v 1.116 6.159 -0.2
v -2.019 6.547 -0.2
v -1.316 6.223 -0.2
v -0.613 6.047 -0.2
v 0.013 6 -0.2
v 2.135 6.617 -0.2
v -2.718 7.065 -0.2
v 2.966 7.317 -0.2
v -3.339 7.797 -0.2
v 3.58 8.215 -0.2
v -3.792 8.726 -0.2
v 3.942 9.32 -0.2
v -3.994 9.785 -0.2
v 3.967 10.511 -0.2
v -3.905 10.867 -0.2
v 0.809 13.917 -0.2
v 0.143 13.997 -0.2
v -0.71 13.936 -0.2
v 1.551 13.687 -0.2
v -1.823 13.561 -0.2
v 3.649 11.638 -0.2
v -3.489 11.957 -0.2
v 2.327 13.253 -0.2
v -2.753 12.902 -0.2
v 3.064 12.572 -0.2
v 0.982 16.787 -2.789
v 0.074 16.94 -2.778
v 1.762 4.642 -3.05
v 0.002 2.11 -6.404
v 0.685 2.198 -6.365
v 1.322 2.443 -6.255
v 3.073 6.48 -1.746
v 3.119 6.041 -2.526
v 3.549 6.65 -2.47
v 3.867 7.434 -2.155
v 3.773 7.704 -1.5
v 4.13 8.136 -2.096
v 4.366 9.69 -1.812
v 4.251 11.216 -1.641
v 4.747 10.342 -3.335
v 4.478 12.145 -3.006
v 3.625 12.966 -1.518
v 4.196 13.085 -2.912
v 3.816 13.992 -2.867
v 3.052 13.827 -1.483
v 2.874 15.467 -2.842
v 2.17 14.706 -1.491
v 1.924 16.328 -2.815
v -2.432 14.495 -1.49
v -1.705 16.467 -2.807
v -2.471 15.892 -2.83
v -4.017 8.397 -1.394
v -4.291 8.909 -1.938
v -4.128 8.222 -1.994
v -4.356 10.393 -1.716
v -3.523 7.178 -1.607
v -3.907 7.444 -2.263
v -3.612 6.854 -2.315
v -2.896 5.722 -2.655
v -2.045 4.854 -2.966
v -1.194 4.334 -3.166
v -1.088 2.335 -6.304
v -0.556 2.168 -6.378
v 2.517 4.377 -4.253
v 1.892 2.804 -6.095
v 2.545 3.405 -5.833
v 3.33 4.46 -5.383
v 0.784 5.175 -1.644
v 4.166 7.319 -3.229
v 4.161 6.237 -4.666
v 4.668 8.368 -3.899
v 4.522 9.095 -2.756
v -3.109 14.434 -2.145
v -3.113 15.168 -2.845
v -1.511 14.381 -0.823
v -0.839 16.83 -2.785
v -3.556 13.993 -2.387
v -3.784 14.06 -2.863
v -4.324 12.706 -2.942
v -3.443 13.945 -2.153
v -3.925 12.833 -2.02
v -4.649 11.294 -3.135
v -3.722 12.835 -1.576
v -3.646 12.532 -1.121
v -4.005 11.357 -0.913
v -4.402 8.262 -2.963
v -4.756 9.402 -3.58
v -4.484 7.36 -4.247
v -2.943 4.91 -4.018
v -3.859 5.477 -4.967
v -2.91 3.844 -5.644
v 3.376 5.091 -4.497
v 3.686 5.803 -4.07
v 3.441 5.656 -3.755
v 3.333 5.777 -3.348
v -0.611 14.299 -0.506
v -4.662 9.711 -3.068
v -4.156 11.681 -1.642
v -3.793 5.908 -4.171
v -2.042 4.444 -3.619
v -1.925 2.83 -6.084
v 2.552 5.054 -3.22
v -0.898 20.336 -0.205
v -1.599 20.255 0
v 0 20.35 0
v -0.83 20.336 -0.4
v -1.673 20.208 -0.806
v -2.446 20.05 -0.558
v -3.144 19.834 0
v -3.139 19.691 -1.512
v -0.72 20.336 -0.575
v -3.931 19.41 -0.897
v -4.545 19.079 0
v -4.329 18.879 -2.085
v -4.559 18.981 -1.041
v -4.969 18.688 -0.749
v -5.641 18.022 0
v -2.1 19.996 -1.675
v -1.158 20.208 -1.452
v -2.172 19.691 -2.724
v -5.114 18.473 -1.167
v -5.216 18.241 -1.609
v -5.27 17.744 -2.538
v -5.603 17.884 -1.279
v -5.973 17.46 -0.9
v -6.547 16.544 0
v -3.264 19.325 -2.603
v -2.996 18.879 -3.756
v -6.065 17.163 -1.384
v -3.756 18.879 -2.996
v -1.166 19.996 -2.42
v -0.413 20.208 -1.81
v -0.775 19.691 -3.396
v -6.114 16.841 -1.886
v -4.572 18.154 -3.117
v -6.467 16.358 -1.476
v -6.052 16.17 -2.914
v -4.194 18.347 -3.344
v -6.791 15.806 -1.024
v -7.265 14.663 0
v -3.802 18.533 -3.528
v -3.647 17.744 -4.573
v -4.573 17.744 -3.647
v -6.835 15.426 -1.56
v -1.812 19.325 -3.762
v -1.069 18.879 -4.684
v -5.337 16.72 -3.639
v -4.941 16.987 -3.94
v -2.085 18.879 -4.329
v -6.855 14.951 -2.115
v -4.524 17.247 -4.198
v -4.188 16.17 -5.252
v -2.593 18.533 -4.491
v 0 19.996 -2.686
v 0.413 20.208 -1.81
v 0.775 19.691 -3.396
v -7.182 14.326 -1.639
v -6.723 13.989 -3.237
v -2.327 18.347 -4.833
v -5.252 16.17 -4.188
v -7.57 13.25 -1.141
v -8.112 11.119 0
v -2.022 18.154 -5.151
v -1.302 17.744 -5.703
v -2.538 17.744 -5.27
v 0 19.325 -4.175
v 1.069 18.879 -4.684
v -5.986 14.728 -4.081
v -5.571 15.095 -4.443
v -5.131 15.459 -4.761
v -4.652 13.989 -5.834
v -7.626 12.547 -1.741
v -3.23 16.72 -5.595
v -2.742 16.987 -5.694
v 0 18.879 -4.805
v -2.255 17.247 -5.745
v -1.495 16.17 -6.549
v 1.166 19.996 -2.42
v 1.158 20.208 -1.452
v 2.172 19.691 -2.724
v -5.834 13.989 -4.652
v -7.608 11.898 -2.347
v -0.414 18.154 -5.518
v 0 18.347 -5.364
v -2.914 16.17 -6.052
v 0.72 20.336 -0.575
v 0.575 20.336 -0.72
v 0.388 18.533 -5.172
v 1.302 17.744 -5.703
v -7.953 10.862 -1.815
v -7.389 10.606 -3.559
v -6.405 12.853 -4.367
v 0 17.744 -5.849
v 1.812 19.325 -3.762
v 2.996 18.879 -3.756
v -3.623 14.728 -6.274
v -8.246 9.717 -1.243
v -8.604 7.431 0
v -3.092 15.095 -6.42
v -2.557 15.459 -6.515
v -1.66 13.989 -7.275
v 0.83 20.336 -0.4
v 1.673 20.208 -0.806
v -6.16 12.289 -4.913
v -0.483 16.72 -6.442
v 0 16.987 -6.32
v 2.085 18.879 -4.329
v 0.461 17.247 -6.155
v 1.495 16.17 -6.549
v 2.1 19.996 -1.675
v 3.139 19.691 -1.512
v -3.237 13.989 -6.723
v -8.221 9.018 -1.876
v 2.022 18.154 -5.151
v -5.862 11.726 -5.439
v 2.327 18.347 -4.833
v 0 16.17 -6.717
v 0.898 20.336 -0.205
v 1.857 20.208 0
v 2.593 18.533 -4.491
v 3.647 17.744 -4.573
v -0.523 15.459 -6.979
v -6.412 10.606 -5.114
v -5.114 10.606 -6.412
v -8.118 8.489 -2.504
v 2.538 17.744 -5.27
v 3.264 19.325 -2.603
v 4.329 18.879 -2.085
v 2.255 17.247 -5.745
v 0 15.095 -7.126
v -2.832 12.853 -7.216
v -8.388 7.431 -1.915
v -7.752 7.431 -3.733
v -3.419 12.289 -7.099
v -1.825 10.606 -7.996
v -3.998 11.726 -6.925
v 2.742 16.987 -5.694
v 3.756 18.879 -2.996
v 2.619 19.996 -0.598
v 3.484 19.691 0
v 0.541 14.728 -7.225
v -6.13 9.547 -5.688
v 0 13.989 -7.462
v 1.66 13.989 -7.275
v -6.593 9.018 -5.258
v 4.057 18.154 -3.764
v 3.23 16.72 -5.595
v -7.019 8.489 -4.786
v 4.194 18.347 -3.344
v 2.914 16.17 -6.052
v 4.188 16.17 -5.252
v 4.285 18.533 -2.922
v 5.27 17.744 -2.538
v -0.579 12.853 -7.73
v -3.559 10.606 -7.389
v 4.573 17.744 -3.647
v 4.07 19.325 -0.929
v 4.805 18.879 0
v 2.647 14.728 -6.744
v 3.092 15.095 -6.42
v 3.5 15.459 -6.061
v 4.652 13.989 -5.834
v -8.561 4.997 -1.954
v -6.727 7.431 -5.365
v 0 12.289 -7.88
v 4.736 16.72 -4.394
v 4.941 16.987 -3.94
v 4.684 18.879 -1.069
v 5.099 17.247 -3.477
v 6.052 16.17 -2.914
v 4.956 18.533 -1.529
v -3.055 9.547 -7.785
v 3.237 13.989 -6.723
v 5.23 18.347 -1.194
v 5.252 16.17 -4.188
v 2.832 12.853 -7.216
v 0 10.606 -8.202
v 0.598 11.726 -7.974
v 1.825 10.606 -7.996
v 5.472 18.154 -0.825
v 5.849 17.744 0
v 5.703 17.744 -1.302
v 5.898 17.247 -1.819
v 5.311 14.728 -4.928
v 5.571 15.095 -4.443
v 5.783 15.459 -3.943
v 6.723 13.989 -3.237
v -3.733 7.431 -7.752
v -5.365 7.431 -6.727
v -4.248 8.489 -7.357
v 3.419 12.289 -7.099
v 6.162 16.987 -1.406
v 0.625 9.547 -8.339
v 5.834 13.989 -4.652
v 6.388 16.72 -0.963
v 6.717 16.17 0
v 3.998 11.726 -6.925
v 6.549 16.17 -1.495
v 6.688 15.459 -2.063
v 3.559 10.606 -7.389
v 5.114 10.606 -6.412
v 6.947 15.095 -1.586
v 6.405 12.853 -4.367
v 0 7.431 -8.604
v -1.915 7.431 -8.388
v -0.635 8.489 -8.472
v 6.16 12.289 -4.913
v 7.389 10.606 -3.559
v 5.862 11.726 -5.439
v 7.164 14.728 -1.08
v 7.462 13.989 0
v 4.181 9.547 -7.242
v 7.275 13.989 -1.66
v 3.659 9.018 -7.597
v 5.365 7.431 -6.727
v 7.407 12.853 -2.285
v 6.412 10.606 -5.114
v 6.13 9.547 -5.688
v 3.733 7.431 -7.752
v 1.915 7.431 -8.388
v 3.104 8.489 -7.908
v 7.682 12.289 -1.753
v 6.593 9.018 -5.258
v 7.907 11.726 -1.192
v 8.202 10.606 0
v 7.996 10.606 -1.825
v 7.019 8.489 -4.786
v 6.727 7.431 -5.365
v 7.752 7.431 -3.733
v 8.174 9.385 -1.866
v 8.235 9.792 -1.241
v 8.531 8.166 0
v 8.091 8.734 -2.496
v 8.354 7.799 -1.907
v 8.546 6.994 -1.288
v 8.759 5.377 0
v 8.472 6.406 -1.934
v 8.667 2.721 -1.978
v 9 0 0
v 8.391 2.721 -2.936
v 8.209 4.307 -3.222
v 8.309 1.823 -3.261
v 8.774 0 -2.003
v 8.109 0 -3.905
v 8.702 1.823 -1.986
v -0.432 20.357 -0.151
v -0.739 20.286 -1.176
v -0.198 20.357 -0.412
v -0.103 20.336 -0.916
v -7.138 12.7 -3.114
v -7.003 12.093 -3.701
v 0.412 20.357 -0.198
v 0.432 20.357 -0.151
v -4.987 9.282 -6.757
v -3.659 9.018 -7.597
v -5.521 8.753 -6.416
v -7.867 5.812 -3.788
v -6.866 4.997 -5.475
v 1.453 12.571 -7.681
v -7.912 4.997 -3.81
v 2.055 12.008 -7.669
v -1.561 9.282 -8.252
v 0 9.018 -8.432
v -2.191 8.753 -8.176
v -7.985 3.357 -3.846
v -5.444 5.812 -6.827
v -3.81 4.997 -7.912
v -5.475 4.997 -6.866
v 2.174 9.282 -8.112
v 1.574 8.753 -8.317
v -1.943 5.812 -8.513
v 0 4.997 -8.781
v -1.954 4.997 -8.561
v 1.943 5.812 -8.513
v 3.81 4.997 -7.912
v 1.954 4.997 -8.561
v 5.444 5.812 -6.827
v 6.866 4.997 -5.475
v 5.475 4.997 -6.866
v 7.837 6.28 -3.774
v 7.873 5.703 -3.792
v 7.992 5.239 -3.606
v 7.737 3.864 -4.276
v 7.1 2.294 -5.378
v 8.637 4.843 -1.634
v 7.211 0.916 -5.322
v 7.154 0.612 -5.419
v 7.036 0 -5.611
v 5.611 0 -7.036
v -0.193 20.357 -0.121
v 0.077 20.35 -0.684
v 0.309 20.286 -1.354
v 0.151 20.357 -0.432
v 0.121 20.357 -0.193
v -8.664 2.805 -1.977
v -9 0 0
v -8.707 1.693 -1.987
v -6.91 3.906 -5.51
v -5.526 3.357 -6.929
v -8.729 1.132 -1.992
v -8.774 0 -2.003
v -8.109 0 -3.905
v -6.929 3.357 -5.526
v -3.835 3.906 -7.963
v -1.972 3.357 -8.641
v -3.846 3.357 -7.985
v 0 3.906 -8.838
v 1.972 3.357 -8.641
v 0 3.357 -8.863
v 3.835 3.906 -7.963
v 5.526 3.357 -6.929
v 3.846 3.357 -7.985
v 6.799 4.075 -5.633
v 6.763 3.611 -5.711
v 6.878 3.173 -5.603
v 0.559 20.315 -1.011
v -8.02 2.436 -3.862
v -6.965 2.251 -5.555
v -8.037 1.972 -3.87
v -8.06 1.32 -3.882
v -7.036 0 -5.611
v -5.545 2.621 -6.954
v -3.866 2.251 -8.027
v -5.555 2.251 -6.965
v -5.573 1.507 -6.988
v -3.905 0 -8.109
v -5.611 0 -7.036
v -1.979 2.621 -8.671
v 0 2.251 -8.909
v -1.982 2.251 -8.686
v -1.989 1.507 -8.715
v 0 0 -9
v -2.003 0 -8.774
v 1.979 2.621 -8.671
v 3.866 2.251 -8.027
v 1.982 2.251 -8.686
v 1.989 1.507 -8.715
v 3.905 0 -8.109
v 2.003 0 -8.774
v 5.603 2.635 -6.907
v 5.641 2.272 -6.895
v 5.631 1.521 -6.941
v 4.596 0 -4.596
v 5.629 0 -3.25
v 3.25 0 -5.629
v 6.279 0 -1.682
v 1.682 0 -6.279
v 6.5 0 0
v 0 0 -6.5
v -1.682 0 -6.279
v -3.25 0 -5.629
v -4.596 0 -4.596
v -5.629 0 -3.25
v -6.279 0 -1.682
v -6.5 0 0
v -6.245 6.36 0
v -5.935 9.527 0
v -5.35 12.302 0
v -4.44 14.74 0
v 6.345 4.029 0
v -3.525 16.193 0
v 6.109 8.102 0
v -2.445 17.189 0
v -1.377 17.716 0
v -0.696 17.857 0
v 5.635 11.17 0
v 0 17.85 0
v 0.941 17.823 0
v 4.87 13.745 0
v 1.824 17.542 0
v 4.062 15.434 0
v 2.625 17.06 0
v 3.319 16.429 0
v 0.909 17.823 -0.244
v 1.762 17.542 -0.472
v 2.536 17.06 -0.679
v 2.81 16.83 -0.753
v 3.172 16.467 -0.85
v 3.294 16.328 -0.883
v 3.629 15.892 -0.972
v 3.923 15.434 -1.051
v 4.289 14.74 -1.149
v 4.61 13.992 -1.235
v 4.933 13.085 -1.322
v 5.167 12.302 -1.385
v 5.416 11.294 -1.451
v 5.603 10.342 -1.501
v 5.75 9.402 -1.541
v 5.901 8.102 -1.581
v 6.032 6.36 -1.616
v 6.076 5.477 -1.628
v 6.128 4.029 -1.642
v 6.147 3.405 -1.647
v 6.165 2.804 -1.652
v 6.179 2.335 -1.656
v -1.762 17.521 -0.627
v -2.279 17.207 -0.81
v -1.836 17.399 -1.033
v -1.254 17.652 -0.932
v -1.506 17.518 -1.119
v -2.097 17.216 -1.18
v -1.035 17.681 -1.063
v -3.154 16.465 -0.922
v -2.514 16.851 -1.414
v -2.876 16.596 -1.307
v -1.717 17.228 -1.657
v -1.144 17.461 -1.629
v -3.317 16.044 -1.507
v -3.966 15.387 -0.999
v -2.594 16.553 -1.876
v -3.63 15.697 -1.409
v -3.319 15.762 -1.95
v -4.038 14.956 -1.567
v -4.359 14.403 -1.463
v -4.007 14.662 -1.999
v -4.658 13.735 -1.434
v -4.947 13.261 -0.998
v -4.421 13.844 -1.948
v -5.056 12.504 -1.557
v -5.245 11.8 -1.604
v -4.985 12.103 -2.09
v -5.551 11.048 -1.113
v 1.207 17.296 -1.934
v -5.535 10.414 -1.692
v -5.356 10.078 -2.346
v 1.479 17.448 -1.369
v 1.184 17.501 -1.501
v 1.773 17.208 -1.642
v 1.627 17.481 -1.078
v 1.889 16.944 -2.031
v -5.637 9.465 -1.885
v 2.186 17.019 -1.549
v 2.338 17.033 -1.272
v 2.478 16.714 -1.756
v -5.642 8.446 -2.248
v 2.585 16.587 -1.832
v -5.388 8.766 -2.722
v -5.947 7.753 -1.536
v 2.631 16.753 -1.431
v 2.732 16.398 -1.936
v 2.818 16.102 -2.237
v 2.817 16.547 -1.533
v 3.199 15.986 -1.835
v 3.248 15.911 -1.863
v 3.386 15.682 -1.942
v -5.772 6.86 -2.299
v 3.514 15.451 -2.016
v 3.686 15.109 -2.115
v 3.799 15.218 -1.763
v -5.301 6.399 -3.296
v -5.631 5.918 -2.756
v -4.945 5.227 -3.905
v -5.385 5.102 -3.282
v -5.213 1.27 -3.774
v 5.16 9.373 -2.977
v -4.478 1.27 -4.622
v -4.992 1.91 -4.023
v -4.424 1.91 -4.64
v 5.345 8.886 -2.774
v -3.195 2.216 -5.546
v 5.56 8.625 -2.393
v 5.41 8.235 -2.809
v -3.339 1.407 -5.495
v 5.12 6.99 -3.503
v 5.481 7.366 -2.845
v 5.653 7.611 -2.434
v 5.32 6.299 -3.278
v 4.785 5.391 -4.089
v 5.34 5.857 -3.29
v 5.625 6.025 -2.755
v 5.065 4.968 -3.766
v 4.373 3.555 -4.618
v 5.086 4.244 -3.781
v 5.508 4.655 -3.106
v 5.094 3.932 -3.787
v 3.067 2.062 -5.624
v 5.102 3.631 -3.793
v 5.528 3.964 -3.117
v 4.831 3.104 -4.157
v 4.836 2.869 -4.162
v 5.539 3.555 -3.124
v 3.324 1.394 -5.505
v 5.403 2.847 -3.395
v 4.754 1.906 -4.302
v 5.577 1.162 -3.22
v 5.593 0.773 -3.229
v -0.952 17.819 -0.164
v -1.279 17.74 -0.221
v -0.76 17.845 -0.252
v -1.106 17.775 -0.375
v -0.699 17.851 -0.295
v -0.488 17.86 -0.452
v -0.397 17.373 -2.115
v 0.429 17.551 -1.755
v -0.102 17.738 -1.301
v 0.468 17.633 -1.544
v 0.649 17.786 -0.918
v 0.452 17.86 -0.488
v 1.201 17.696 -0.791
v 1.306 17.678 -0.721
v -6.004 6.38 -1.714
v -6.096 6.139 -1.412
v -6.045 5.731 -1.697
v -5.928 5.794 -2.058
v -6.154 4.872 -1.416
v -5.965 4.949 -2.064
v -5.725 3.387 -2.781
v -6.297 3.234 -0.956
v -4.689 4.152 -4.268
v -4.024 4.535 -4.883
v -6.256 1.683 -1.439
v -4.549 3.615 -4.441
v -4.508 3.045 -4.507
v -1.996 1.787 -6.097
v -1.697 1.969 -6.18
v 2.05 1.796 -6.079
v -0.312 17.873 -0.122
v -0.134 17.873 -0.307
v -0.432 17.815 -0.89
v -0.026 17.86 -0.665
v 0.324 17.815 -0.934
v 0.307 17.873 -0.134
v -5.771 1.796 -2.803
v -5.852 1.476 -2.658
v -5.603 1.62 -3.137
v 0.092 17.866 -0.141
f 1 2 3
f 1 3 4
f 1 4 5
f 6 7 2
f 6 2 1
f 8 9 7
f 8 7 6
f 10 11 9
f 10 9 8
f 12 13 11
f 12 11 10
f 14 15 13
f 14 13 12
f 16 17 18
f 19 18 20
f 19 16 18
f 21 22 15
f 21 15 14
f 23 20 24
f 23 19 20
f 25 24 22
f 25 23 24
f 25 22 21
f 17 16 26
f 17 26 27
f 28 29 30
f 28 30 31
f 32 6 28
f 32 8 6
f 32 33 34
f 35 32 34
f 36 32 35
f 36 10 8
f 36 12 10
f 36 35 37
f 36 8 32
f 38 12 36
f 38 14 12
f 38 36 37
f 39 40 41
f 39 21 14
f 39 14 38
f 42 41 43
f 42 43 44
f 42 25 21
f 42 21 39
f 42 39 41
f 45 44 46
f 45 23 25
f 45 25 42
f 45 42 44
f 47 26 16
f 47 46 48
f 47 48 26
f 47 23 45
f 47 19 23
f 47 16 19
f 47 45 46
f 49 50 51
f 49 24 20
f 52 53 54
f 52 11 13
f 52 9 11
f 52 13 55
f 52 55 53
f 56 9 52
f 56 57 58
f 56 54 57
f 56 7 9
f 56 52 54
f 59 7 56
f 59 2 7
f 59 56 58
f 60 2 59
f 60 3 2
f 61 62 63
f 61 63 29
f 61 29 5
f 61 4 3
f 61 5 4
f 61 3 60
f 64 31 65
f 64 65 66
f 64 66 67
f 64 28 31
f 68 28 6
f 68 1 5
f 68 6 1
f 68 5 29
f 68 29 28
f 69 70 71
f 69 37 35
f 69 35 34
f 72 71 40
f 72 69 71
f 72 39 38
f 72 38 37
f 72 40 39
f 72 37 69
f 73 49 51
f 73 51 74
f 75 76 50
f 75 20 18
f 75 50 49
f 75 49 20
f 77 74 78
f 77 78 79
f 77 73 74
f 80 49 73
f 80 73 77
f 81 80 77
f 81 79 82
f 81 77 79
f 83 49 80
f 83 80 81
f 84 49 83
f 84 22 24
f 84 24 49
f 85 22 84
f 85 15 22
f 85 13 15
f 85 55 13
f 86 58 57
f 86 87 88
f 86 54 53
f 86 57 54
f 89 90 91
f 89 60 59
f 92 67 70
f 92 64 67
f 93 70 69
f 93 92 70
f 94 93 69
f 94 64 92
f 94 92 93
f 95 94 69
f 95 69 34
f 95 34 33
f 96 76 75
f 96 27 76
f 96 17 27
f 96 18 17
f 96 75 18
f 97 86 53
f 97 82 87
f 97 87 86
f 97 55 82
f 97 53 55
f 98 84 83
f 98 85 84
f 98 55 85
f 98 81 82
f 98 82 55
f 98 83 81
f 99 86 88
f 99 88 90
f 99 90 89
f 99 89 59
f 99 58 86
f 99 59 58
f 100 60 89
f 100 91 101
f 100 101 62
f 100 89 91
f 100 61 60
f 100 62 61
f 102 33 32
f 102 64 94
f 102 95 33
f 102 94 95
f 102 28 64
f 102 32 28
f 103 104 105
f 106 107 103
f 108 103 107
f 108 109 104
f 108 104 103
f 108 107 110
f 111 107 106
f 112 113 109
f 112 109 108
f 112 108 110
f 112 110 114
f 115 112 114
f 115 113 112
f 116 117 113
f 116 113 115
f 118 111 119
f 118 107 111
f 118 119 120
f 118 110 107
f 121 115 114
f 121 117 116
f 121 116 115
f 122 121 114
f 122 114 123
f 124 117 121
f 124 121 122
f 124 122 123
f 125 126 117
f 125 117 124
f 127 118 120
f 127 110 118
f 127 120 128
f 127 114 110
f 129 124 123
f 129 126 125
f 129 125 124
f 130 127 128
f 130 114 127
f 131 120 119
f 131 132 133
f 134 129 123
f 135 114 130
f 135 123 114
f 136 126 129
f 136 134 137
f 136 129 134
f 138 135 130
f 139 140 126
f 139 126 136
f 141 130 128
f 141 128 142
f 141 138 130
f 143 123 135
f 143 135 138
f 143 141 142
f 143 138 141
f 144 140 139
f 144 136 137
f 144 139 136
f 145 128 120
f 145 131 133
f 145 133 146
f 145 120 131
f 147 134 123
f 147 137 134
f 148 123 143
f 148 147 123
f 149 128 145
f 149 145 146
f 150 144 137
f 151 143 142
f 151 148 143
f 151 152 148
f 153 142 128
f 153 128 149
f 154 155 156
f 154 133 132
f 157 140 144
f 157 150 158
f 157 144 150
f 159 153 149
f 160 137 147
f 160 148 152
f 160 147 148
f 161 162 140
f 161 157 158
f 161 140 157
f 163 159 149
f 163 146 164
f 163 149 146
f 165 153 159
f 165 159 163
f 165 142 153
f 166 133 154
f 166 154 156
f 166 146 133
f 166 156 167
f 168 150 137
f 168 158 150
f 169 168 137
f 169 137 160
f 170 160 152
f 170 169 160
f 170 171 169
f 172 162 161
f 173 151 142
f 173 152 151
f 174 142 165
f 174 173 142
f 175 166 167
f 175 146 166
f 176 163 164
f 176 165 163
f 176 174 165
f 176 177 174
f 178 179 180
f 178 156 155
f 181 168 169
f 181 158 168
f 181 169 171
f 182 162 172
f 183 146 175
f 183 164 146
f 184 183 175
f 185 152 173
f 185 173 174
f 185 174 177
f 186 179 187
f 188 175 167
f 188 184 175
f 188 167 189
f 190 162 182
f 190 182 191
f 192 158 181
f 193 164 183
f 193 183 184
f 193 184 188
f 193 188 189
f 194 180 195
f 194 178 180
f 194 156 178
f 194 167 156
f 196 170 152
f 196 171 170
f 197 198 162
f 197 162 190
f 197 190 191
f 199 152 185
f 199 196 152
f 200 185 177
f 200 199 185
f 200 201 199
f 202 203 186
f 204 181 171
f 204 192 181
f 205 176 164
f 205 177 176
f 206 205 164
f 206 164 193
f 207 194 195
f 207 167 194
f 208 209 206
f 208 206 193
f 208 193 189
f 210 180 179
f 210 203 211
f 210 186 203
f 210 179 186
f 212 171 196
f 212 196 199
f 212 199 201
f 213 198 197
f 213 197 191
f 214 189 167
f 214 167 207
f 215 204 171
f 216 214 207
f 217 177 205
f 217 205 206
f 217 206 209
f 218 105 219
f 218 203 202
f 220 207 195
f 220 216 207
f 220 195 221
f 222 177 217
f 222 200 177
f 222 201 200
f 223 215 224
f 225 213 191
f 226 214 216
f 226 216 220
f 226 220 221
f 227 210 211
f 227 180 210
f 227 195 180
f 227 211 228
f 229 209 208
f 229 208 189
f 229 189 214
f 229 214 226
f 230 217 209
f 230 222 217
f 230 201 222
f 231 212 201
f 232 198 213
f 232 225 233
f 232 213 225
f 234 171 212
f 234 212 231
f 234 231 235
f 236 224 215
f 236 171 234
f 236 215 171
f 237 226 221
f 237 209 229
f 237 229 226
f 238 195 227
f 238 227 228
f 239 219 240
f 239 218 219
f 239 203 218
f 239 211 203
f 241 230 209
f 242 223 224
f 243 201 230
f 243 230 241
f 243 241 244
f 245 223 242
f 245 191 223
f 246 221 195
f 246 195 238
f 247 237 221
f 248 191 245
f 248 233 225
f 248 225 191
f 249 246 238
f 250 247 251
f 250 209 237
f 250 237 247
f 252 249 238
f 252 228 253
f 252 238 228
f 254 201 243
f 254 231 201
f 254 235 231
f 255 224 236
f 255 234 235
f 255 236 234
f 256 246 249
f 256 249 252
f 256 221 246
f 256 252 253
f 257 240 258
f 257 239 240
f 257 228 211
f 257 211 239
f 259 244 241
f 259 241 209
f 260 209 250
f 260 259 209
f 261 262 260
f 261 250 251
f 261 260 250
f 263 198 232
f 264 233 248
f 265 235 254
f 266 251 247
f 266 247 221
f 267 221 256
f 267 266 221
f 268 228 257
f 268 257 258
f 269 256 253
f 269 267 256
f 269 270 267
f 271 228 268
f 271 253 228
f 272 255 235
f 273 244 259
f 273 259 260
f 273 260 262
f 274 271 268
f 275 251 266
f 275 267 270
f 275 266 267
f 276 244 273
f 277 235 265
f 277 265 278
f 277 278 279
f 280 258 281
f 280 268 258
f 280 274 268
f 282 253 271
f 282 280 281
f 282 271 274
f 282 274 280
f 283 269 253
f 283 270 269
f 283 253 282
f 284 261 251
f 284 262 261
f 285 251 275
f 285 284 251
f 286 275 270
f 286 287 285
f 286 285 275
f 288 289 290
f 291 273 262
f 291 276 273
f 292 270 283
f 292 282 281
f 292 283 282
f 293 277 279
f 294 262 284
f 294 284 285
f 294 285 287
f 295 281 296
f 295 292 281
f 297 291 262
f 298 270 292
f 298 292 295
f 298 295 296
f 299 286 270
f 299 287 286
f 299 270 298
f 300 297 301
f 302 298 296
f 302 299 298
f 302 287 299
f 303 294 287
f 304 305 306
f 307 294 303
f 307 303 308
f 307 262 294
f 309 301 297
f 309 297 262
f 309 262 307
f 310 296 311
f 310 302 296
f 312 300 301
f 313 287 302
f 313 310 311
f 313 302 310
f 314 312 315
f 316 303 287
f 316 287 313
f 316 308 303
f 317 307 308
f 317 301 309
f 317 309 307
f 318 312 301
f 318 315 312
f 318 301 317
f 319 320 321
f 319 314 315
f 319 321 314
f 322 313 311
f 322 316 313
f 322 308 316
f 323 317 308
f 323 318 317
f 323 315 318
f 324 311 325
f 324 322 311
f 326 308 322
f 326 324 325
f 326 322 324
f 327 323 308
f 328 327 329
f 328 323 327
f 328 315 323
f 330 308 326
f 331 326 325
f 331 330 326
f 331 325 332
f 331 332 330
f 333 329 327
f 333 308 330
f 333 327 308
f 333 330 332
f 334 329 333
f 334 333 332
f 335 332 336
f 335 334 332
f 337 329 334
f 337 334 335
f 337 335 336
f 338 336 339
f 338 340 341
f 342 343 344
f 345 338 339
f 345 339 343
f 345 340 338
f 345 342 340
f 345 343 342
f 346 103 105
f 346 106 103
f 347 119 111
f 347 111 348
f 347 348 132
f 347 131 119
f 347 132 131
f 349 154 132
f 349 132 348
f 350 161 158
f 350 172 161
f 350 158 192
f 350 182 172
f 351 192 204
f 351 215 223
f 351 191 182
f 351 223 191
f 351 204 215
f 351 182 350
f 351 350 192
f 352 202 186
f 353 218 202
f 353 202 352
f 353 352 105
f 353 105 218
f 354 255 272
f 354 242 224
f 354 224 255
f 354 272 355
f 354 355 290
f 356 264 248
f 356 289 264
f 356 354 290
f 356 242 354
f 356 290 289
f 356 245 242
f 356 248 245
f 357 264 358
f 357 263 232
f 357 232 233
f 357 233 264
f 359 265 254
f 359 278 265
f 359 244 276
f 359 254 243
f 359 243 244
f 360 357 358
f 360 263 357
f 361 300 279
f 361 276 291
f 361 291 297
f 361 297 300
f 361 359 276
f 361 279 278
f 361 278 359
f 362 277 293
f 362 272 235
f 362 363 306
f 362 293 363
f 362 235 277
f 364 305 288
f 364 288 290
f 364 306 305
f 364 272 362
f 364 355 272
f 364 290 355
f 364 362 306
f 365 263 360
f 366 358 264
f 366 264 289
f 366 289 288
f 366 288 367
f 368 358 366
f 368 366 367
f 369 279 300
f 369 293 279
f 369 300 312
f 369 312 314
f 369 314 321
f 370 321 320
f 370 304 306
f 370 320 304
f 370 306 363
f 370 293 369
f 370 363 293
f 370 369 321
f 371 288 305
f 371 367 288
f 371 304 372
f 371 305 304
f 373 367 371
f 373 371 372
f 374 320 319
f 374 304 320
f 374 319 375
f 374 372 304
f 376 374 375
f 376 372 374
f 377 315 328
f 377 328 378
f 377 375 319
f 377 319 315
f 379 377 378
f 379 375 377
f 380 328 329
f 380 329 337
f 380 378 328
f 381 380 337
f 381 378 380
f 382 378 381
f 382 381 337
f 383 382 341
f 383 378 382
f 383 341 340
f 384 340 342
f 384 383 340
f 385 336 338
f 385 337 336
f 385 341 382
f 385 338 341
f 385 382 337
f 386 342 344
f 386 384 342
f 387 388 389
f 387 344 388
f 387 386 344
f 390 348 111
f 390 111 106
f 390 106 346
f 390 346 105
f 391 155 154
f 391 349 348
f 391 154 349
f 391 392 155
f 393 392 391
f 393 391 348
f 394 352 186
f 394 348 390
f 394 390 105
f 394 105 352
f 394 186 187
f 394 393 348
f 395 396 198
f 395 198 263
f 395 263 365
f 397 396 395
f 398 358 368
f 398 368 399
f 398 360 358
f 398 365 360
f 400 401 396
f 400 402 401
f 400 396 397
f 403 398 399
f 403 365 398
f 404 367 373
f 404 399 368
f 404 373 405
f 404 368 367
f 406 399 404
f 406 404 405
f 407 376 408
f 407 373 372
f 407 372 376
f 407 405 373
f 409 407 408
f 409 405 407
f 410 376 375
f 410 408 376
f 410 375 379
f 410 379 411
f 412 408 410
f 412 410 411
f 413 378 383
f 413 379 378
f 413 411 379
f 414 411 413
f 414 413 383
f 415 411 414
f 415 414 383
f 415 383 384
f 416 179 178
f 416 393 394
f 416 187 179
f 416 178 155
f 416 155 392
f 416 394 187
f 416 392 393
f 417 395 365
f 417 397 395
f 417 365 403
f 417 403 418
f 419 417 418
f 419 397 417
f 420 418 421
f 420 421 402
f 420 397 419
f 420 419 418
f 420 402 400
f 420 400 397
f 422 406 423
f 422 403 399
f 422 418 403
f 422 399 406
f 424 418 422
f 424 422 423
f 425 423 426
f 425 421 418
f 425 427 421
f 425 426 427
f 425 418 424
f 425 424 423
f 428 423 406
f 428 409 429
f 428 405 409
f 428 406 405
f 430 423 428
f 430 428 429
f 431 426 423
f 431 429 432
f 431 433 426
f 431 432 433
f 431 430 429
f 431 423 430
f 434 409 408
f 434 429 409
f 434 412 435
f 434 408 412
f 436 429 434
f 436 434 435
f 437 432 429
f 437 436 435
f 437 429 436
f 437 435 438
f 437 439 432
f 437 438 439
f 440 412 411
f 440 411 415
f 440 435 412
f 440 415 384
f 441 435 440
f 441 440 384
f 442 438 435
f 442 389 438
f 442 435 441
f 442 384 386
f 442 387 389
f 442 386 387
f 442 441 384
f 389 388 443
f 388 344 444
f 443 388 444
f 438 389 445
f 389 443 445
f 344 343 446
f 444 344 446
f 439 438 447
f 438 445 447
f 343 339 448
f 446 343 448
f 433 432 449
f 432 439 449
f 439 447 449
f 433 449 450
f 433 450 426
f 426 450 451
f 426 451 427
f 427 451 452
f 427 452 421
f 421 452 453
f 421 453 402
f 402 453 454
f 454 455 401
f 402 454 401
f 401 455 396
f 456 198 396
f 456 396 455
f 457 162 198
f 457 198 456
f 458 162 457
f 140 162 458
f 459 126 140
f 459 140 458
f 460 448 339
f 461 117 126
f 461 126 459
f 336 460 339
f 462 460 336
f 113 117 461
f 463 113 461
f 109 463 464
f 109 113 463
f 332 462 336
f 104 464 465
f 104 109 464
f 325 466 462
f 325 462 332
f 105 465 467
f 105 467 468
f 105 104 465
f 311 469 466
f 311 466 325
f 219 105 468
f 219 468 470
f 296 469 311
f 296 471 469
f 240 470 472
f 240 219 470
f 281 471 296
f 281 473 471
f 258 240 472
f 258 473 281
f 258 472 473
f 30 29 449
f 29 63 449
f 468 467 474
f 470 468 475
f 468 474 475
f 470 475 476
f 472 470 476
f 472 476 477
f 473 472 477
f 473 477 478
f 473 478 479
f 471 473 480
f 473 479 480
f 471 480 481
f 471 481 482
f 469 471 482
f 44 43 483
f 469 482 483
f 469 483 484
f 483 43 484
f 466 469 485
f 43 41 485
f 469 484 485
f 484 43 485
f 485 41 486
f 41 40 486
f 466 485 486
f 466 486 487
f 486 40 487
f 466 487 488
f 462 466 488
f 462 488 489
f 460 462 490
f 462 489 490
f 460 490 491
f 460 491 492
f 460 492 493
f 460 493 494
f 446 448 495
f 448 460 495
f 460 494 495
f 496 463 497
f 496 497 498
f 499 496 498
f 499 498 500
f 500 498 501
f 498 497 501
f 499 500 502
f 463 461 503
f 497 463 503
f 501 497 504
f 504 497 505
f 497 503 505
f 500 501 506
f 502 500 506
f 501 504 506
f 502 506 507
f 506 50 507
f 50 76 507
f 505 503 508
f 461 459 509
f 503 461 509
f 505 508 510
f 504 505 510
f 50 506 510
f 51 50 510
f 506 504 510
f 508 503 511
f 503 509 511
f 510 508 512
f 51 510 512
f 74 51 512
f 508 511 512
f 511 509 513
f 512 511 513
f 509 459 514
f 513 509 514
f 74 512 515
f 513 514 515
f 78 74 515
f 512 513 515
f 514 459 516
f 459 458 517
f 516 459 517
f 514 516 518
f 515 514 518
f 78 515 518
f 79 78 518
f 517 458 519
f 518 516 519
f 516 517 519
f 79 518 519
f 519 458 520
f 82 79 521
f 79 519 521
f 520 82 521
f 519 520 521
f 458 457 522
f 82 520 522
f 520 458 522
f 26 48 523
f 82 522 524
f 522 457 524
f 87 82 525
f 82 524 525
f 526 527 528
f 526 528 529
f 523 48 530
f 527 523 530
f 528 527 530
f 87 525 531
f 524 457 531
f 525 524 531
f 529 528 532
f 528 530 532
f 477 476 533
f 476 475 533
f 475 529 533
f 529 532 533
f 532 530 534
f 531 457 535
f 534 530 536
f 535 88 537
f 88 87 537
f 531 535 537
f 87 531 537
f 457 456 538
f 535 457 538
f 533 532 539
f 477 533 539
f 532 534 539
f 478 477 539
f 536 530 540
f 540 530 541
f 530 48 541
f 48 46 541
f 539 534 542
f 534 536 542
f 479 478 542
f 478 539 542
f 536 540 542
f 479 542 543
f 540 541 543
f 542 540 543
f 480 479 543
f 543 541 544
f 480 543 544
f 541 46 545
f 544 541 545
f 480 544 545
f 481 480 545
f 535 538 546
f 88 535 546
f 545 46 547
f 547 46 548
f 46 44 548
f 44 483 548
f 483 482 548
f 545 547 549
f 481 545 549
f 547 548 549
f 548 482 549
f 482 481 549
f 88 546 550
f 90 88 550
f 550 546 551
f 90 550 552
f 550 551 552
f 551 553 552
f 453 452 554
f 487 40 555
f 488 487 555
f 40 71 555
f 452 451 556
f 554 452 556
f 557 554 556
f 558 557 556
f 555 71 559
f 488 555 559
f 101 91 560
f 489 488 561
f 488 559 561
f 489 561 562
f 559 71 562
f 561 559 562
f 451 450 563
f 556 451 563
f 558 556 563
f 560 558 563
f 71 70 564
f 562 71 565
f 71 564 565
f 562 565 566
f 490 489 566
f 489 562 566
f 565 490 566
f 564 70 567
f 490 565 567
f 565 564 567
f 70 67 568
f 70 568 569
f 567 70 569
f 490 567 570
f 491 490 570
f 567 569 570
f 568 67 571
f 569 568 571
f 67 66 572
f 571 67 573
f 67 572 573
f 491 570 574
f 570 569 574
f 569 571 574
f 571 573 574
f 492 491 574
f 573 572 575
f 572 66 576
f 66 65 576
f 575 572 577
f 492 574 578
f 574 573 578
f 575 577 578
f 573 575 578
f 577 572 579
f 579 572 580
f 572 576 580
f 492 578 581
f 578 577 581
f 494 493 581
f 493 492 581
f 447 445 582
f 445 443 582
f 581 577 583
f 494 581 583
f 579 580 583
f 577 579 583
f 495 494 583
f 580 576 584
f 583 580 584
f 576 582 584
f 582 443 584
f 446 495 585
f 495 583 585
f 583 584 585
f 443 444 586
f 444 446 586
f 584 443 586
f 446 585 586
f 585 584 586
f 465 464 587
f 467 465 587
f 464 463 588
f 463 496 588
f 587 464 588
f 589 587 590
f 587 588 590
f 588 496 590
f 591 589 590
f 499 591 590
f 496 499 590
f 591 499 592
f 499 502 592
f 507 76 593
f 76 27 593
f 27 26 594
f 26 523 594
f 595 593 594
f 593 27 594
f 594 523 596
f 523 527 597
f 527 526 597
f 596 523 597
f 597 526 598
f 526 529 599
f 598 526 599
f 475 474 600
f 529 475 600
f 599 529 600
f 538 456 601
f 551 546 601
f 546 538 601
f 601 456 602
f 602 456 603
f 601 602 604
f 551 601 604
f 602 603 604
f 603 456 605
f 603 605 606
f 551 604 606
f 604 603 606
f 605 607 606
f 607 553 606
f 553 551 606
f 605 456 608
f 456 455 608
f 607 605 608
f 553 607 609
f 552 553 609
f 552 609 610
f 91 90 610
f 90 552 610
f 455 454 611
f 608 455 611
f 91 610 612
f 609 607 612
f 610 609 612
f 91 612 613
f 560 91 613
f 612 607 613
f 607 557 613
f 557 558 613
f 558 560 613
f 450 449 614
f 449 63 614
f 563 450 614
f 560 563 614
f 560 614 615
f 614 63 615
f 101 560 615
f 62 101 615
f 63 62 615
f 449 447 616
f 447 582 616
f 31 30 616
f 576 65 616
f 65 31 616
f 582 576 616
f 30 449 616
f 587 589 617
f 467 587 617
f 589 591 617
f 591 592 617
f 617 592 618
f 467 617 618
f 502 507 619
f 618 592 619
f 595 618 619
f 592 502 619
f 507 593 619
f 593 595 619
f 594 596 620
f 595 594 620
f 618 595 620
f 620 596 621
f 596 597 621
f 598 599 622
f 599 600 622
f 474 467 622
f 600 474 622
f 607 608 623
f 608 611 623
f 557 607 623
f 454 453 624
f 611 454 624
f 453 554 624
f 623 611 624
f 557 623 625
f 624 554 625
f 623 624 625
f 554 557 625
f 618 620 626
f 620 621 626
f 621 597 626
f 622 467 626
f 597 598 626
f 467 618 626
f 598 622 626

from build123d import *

# Parameters (mm, degrees)
SKETCH2_W          = 21.920038039
SKETCH2_H          = 22.914873095
CUT_EXTRUDE1_DEPTH = 9


with BuildPart() as part:
    # Sketch1 → Revolve1 (revolve)
    with BuildSketch(Plane.XY):
        with BuildLine():
            Line((6.5, 0), (9, 0))
            add(Edge.make_bspline(
                [(0, 20.35), (1.675966842, 20.428176516), (5.66035993, 19.372470149), (8.740520085, 10.941984052), (8.794057121, 4.785623995), (9, 0)],
                knots=[0, 0, 0, 0, 0.209086974, 0.440428739, 1, 1, 1, 1], degree=3))
            Line((0, 20.35), (0, 17.85))
            add(Edge.make_bspline(
                [(0, 17.85), (1.248468613, 18.003104069), (3.434295374, 16.83334968), (6.617297319, 10.514055415), (6.220398856, 4.532307189), (6.5, 0)],
                knots=[0, 0, 0, 0, 0.174730572, 0.328981961, 1, 1, 1, 1], degree=3))
        make_face()
    revolve(axis=Axis((0, 24.080193906, 0), (0, -1, 0)))

    # Sketch2 → Cut-Extrude1 (cut)
    with BuildSketch(Plane.XY.offset(9)):
        with Locations((-0.139254467, 10.620448961)):
            Rectangle(SKETCH2_W, SKETCH2_H)
    extrude(amount=-CUT_EXTRUDE1_DEPTH, mode=Mode.SUBTRACT)

    # Loft1: read off the stored shape, not the designer's step
    # Loft1: loft between two sections, ruled curve by curve
    loft1_from = [
        Edge.make_bspline([(0, 1.344428361, -7.62463212), (10.784005956, 1.344428361, -7.62463212), (10.784005956, 18.932107275, -4.523449799), (0, 18.932107275, -4.523449799), (-10.784005956, 18.932107275, -4.523449799), (-10.784005956, 1.344428361, -7.62463212), (0, 1.344428361, -7.62463212)], [0, 0, 0, 0, 0.5, 0.5, 0.5, 1, 1, 1, 1], 3, [1, 0.333333333, 0.333333333, 1, 0.333333333, 0.333333333, 1]),
    ]
    loft1_to = [
        Edge.make_bspline([(0.012725843, 6.000020243, -0.2), (8.012685357, 6.02547193, -0.2), (7.98723367, 14.025431443, -0.2), (-0.012725843, 13.999979757, -0.2), (-8.012685357, 13.97452807, -0.2), (-7.98723367, 5.974568557, -0.2), (0.012725843, 6.000020243, -0.2)], [0, 0, 0, 0, 0.5, 0.5, 0.5, 1, 1, 1, 1], 3, [1, 0.333333333, 0.333333333, 1, 0.333333333, 0.333333333, 1]),
    ]
    loft1 = Solid(Shell([*[Face.make_surface_from_curves(loft1_from[k], loft1_to[k]) for k in range(1)], Face(Wire(loft1_from)), Face(Wire(loft1_to))]))
    add(loft1)


solid = part.part
